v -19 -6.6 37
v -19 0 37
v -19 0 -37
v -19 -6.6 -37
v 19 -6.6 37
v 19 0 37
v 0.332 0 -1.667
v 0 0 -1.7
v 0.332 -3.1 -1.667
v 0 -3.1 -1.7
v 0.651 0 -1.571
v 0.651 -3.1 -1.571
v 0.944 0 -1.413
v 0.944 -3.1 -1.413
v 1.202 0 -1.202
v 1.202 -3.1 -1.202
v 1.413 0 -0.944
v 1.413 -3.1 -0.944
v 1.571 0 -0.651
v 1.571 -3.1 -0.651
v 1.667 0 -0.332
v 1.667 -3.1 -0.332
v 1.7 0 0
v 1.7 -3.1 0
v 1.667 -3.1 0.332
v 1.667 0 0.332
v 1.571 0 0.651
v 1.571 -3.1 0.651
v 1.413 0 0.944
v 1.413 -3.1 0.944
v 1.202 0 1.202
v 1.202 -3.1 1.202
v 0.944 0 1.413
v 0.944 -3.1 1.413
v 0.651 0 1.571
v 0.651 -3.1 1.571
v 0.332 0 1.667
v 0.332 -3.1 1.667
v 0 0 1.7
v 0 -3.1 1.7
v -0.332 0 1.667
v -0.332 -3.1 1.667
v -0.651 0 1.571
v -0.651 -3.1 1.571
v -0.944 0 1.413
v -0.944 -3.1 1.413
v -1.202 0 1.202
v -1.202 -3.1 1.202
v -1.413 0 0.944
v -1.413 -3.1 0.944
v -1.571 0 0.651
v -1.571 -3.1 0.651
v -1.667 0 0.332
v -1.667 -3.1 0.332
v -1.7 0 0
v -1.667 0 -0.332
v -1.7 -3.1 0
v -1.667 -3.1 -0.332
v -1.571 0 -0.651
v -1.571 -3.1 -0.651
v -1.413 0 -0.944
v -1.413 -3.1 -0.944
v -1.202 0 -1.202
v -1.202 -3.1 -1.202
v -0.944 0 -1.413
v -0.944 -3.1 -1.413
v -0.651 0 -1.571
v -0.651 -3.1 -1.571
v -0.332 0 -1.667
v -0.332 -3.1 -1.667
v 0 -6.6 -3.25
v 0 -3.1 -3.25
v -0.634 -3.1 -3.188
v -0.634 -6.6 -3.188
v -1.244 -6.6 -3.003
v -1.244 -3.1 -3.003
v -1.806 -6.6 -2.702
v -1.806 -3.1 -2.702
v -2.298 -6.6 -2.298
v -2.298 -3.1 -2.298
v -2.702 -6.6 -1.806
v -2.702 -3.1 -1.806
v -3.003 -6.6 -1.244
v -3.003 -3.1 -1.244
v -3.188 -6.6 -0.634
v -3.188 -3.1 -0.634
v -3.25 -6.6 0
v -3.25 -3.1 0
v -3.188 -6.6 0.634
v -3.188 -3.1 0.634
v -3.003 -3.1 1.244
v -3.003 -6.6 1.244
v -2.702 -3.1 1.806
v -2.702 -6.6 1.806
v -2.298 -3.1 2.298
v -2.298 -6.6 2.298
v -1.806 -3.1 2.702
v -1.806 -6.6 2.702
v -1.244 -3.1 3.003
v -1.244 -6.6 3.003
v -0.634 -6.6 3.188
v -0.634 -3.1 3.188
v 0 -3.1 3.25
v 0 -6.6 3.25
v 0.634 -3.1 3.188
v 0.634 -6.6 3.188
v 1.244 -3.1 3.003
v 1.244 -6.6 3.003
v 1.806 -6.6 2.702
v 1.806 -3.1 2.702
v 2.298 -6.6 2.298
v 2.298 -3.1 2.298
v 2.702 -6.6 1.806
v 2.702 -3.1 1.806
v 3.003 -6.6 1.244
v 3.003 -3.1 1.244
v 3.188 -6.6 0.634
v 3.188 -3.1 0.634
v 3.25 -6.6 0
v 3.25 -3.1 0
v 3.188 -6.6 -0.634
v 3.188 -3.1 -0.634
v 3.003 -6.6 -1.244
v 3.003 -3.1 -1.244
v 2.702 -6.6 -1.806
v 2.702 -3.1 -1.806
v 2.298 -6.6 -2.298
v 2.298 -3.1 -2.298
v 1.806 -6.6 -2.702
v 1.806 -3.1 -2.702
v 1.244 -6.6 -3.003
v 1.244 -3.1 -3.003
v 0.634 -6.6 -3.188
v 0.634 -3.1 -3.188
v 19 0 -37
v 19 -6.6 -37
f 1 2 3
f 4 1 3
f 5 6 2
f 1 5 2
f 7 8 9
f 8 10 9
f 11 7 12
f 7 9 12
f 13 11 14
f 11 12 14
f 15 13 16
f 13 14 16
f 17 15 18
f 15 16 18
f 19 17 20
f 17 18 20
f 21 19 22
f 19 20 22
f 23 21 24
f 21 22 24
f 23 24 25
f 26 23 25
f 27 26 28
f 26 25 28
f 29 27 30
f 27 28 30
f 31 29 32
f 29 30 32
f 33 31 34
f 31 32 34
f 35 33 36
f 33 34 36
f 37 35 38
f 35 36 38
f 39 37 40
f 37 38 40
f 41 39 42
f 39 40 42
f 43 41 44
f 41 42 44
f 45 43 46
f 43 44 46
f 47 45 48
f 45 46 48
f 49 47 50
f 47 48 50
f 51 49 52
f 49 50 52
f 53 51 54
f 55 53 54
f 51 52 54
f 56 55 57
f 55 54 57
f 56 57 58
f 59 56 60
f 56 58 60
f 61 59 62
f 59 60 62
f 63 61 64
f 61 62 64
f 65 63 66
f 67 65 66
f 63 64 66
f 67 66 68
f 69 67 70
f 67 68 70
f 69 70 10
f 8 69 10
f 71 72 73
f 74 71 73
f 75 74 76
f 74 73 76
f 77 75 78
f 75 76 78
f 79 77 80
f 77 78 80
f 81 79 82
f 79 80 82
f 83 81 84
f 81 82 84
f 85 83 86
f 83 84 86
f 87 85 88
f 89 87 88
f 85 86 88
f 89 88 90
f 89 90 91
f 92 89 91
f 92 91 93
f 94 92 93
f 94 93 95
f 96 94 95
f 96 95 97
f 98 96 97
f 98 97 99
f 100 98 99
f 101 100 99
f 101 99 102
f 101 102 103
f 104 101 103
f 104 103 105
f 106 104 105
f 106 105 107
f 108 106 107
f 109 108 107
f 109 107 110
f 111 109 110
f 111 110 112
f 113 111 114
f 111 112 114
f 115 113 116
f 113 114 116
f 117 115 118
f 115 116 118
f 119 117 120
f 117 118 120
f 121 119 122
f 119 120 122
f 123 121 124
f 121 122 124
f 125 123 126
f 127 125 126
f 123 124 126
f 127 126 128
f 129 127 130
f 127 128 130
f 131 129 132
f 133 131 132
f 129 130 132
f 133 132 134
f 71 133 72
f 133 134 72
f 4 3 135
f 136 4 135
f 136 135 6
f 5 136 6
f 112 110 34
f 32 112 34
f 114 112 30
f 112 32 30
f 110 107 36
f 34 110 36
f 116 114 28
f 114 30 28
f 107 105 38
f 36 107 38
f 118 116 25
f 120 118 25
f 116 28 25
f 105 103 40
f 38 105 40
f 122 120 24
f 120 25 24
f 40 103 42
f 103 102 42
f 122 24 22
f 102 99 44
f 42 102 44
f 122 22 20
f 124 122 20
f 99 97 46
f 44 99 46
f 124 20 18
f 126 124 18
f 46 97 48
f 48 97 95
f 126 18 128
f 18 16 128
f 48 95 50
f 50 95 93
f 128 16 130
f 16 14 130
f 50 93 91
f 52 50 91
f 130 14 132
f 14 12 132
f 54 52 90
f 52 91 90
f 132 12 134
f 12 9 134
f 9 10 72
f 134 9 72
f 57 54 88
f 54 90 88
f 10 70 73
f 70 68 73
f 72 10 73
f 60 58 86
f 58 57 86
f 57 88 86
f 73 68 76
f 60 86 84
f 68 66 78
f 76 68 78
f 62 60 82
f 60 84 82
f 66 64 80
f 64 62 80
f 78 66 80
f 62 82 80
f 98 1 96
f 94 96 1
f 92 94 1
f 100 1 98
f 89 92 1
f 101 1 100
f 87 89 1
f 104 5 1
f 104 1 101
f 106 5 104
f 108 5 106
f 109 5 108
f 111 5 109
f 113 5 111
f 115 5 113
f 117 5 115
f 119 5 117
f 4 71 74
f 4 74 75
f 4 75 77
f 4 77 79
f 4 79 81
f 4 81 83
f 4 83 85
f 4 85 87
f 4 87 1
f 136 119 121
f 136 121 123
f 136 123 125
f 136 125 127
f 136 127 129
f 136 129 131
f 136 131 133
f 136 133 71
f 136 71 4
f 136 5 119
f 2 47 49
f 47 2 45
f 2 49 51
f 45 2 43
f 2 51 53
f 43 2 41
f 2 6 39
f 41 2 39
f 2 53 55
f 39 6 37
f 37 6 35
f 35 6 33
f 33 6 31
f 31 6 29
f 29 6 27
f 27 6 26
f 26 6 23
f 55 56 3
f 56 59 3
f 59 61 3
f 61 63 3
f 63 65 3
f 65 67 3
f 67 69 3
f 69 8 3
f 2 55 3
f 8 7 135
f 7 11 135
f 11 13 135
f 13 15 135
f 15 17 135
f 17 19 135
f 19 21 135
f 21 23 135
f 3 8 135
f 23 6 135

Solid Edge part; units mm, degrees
sketch "Sketch1" plane through (0, 0, 0) normal (0, -1, 0) x (1, 0, 0)
  line L0 (19, 37) -> (-19, 37)
  line L1 (-19, 37) -> (-19, -37)
  line L2 (-19, -37) -> (19, -37)
  line L3 (19, -37) -> (19, 37)
extrude "Protrusion1" add sketch "Sketch1" along normal blind 6.6
hole "Hole_1" at (0, -6.6, 0) direction (0, 1, 0) diameter 3.4 end up to next counterbore diameter 6.5 counterbore depth 3.5
